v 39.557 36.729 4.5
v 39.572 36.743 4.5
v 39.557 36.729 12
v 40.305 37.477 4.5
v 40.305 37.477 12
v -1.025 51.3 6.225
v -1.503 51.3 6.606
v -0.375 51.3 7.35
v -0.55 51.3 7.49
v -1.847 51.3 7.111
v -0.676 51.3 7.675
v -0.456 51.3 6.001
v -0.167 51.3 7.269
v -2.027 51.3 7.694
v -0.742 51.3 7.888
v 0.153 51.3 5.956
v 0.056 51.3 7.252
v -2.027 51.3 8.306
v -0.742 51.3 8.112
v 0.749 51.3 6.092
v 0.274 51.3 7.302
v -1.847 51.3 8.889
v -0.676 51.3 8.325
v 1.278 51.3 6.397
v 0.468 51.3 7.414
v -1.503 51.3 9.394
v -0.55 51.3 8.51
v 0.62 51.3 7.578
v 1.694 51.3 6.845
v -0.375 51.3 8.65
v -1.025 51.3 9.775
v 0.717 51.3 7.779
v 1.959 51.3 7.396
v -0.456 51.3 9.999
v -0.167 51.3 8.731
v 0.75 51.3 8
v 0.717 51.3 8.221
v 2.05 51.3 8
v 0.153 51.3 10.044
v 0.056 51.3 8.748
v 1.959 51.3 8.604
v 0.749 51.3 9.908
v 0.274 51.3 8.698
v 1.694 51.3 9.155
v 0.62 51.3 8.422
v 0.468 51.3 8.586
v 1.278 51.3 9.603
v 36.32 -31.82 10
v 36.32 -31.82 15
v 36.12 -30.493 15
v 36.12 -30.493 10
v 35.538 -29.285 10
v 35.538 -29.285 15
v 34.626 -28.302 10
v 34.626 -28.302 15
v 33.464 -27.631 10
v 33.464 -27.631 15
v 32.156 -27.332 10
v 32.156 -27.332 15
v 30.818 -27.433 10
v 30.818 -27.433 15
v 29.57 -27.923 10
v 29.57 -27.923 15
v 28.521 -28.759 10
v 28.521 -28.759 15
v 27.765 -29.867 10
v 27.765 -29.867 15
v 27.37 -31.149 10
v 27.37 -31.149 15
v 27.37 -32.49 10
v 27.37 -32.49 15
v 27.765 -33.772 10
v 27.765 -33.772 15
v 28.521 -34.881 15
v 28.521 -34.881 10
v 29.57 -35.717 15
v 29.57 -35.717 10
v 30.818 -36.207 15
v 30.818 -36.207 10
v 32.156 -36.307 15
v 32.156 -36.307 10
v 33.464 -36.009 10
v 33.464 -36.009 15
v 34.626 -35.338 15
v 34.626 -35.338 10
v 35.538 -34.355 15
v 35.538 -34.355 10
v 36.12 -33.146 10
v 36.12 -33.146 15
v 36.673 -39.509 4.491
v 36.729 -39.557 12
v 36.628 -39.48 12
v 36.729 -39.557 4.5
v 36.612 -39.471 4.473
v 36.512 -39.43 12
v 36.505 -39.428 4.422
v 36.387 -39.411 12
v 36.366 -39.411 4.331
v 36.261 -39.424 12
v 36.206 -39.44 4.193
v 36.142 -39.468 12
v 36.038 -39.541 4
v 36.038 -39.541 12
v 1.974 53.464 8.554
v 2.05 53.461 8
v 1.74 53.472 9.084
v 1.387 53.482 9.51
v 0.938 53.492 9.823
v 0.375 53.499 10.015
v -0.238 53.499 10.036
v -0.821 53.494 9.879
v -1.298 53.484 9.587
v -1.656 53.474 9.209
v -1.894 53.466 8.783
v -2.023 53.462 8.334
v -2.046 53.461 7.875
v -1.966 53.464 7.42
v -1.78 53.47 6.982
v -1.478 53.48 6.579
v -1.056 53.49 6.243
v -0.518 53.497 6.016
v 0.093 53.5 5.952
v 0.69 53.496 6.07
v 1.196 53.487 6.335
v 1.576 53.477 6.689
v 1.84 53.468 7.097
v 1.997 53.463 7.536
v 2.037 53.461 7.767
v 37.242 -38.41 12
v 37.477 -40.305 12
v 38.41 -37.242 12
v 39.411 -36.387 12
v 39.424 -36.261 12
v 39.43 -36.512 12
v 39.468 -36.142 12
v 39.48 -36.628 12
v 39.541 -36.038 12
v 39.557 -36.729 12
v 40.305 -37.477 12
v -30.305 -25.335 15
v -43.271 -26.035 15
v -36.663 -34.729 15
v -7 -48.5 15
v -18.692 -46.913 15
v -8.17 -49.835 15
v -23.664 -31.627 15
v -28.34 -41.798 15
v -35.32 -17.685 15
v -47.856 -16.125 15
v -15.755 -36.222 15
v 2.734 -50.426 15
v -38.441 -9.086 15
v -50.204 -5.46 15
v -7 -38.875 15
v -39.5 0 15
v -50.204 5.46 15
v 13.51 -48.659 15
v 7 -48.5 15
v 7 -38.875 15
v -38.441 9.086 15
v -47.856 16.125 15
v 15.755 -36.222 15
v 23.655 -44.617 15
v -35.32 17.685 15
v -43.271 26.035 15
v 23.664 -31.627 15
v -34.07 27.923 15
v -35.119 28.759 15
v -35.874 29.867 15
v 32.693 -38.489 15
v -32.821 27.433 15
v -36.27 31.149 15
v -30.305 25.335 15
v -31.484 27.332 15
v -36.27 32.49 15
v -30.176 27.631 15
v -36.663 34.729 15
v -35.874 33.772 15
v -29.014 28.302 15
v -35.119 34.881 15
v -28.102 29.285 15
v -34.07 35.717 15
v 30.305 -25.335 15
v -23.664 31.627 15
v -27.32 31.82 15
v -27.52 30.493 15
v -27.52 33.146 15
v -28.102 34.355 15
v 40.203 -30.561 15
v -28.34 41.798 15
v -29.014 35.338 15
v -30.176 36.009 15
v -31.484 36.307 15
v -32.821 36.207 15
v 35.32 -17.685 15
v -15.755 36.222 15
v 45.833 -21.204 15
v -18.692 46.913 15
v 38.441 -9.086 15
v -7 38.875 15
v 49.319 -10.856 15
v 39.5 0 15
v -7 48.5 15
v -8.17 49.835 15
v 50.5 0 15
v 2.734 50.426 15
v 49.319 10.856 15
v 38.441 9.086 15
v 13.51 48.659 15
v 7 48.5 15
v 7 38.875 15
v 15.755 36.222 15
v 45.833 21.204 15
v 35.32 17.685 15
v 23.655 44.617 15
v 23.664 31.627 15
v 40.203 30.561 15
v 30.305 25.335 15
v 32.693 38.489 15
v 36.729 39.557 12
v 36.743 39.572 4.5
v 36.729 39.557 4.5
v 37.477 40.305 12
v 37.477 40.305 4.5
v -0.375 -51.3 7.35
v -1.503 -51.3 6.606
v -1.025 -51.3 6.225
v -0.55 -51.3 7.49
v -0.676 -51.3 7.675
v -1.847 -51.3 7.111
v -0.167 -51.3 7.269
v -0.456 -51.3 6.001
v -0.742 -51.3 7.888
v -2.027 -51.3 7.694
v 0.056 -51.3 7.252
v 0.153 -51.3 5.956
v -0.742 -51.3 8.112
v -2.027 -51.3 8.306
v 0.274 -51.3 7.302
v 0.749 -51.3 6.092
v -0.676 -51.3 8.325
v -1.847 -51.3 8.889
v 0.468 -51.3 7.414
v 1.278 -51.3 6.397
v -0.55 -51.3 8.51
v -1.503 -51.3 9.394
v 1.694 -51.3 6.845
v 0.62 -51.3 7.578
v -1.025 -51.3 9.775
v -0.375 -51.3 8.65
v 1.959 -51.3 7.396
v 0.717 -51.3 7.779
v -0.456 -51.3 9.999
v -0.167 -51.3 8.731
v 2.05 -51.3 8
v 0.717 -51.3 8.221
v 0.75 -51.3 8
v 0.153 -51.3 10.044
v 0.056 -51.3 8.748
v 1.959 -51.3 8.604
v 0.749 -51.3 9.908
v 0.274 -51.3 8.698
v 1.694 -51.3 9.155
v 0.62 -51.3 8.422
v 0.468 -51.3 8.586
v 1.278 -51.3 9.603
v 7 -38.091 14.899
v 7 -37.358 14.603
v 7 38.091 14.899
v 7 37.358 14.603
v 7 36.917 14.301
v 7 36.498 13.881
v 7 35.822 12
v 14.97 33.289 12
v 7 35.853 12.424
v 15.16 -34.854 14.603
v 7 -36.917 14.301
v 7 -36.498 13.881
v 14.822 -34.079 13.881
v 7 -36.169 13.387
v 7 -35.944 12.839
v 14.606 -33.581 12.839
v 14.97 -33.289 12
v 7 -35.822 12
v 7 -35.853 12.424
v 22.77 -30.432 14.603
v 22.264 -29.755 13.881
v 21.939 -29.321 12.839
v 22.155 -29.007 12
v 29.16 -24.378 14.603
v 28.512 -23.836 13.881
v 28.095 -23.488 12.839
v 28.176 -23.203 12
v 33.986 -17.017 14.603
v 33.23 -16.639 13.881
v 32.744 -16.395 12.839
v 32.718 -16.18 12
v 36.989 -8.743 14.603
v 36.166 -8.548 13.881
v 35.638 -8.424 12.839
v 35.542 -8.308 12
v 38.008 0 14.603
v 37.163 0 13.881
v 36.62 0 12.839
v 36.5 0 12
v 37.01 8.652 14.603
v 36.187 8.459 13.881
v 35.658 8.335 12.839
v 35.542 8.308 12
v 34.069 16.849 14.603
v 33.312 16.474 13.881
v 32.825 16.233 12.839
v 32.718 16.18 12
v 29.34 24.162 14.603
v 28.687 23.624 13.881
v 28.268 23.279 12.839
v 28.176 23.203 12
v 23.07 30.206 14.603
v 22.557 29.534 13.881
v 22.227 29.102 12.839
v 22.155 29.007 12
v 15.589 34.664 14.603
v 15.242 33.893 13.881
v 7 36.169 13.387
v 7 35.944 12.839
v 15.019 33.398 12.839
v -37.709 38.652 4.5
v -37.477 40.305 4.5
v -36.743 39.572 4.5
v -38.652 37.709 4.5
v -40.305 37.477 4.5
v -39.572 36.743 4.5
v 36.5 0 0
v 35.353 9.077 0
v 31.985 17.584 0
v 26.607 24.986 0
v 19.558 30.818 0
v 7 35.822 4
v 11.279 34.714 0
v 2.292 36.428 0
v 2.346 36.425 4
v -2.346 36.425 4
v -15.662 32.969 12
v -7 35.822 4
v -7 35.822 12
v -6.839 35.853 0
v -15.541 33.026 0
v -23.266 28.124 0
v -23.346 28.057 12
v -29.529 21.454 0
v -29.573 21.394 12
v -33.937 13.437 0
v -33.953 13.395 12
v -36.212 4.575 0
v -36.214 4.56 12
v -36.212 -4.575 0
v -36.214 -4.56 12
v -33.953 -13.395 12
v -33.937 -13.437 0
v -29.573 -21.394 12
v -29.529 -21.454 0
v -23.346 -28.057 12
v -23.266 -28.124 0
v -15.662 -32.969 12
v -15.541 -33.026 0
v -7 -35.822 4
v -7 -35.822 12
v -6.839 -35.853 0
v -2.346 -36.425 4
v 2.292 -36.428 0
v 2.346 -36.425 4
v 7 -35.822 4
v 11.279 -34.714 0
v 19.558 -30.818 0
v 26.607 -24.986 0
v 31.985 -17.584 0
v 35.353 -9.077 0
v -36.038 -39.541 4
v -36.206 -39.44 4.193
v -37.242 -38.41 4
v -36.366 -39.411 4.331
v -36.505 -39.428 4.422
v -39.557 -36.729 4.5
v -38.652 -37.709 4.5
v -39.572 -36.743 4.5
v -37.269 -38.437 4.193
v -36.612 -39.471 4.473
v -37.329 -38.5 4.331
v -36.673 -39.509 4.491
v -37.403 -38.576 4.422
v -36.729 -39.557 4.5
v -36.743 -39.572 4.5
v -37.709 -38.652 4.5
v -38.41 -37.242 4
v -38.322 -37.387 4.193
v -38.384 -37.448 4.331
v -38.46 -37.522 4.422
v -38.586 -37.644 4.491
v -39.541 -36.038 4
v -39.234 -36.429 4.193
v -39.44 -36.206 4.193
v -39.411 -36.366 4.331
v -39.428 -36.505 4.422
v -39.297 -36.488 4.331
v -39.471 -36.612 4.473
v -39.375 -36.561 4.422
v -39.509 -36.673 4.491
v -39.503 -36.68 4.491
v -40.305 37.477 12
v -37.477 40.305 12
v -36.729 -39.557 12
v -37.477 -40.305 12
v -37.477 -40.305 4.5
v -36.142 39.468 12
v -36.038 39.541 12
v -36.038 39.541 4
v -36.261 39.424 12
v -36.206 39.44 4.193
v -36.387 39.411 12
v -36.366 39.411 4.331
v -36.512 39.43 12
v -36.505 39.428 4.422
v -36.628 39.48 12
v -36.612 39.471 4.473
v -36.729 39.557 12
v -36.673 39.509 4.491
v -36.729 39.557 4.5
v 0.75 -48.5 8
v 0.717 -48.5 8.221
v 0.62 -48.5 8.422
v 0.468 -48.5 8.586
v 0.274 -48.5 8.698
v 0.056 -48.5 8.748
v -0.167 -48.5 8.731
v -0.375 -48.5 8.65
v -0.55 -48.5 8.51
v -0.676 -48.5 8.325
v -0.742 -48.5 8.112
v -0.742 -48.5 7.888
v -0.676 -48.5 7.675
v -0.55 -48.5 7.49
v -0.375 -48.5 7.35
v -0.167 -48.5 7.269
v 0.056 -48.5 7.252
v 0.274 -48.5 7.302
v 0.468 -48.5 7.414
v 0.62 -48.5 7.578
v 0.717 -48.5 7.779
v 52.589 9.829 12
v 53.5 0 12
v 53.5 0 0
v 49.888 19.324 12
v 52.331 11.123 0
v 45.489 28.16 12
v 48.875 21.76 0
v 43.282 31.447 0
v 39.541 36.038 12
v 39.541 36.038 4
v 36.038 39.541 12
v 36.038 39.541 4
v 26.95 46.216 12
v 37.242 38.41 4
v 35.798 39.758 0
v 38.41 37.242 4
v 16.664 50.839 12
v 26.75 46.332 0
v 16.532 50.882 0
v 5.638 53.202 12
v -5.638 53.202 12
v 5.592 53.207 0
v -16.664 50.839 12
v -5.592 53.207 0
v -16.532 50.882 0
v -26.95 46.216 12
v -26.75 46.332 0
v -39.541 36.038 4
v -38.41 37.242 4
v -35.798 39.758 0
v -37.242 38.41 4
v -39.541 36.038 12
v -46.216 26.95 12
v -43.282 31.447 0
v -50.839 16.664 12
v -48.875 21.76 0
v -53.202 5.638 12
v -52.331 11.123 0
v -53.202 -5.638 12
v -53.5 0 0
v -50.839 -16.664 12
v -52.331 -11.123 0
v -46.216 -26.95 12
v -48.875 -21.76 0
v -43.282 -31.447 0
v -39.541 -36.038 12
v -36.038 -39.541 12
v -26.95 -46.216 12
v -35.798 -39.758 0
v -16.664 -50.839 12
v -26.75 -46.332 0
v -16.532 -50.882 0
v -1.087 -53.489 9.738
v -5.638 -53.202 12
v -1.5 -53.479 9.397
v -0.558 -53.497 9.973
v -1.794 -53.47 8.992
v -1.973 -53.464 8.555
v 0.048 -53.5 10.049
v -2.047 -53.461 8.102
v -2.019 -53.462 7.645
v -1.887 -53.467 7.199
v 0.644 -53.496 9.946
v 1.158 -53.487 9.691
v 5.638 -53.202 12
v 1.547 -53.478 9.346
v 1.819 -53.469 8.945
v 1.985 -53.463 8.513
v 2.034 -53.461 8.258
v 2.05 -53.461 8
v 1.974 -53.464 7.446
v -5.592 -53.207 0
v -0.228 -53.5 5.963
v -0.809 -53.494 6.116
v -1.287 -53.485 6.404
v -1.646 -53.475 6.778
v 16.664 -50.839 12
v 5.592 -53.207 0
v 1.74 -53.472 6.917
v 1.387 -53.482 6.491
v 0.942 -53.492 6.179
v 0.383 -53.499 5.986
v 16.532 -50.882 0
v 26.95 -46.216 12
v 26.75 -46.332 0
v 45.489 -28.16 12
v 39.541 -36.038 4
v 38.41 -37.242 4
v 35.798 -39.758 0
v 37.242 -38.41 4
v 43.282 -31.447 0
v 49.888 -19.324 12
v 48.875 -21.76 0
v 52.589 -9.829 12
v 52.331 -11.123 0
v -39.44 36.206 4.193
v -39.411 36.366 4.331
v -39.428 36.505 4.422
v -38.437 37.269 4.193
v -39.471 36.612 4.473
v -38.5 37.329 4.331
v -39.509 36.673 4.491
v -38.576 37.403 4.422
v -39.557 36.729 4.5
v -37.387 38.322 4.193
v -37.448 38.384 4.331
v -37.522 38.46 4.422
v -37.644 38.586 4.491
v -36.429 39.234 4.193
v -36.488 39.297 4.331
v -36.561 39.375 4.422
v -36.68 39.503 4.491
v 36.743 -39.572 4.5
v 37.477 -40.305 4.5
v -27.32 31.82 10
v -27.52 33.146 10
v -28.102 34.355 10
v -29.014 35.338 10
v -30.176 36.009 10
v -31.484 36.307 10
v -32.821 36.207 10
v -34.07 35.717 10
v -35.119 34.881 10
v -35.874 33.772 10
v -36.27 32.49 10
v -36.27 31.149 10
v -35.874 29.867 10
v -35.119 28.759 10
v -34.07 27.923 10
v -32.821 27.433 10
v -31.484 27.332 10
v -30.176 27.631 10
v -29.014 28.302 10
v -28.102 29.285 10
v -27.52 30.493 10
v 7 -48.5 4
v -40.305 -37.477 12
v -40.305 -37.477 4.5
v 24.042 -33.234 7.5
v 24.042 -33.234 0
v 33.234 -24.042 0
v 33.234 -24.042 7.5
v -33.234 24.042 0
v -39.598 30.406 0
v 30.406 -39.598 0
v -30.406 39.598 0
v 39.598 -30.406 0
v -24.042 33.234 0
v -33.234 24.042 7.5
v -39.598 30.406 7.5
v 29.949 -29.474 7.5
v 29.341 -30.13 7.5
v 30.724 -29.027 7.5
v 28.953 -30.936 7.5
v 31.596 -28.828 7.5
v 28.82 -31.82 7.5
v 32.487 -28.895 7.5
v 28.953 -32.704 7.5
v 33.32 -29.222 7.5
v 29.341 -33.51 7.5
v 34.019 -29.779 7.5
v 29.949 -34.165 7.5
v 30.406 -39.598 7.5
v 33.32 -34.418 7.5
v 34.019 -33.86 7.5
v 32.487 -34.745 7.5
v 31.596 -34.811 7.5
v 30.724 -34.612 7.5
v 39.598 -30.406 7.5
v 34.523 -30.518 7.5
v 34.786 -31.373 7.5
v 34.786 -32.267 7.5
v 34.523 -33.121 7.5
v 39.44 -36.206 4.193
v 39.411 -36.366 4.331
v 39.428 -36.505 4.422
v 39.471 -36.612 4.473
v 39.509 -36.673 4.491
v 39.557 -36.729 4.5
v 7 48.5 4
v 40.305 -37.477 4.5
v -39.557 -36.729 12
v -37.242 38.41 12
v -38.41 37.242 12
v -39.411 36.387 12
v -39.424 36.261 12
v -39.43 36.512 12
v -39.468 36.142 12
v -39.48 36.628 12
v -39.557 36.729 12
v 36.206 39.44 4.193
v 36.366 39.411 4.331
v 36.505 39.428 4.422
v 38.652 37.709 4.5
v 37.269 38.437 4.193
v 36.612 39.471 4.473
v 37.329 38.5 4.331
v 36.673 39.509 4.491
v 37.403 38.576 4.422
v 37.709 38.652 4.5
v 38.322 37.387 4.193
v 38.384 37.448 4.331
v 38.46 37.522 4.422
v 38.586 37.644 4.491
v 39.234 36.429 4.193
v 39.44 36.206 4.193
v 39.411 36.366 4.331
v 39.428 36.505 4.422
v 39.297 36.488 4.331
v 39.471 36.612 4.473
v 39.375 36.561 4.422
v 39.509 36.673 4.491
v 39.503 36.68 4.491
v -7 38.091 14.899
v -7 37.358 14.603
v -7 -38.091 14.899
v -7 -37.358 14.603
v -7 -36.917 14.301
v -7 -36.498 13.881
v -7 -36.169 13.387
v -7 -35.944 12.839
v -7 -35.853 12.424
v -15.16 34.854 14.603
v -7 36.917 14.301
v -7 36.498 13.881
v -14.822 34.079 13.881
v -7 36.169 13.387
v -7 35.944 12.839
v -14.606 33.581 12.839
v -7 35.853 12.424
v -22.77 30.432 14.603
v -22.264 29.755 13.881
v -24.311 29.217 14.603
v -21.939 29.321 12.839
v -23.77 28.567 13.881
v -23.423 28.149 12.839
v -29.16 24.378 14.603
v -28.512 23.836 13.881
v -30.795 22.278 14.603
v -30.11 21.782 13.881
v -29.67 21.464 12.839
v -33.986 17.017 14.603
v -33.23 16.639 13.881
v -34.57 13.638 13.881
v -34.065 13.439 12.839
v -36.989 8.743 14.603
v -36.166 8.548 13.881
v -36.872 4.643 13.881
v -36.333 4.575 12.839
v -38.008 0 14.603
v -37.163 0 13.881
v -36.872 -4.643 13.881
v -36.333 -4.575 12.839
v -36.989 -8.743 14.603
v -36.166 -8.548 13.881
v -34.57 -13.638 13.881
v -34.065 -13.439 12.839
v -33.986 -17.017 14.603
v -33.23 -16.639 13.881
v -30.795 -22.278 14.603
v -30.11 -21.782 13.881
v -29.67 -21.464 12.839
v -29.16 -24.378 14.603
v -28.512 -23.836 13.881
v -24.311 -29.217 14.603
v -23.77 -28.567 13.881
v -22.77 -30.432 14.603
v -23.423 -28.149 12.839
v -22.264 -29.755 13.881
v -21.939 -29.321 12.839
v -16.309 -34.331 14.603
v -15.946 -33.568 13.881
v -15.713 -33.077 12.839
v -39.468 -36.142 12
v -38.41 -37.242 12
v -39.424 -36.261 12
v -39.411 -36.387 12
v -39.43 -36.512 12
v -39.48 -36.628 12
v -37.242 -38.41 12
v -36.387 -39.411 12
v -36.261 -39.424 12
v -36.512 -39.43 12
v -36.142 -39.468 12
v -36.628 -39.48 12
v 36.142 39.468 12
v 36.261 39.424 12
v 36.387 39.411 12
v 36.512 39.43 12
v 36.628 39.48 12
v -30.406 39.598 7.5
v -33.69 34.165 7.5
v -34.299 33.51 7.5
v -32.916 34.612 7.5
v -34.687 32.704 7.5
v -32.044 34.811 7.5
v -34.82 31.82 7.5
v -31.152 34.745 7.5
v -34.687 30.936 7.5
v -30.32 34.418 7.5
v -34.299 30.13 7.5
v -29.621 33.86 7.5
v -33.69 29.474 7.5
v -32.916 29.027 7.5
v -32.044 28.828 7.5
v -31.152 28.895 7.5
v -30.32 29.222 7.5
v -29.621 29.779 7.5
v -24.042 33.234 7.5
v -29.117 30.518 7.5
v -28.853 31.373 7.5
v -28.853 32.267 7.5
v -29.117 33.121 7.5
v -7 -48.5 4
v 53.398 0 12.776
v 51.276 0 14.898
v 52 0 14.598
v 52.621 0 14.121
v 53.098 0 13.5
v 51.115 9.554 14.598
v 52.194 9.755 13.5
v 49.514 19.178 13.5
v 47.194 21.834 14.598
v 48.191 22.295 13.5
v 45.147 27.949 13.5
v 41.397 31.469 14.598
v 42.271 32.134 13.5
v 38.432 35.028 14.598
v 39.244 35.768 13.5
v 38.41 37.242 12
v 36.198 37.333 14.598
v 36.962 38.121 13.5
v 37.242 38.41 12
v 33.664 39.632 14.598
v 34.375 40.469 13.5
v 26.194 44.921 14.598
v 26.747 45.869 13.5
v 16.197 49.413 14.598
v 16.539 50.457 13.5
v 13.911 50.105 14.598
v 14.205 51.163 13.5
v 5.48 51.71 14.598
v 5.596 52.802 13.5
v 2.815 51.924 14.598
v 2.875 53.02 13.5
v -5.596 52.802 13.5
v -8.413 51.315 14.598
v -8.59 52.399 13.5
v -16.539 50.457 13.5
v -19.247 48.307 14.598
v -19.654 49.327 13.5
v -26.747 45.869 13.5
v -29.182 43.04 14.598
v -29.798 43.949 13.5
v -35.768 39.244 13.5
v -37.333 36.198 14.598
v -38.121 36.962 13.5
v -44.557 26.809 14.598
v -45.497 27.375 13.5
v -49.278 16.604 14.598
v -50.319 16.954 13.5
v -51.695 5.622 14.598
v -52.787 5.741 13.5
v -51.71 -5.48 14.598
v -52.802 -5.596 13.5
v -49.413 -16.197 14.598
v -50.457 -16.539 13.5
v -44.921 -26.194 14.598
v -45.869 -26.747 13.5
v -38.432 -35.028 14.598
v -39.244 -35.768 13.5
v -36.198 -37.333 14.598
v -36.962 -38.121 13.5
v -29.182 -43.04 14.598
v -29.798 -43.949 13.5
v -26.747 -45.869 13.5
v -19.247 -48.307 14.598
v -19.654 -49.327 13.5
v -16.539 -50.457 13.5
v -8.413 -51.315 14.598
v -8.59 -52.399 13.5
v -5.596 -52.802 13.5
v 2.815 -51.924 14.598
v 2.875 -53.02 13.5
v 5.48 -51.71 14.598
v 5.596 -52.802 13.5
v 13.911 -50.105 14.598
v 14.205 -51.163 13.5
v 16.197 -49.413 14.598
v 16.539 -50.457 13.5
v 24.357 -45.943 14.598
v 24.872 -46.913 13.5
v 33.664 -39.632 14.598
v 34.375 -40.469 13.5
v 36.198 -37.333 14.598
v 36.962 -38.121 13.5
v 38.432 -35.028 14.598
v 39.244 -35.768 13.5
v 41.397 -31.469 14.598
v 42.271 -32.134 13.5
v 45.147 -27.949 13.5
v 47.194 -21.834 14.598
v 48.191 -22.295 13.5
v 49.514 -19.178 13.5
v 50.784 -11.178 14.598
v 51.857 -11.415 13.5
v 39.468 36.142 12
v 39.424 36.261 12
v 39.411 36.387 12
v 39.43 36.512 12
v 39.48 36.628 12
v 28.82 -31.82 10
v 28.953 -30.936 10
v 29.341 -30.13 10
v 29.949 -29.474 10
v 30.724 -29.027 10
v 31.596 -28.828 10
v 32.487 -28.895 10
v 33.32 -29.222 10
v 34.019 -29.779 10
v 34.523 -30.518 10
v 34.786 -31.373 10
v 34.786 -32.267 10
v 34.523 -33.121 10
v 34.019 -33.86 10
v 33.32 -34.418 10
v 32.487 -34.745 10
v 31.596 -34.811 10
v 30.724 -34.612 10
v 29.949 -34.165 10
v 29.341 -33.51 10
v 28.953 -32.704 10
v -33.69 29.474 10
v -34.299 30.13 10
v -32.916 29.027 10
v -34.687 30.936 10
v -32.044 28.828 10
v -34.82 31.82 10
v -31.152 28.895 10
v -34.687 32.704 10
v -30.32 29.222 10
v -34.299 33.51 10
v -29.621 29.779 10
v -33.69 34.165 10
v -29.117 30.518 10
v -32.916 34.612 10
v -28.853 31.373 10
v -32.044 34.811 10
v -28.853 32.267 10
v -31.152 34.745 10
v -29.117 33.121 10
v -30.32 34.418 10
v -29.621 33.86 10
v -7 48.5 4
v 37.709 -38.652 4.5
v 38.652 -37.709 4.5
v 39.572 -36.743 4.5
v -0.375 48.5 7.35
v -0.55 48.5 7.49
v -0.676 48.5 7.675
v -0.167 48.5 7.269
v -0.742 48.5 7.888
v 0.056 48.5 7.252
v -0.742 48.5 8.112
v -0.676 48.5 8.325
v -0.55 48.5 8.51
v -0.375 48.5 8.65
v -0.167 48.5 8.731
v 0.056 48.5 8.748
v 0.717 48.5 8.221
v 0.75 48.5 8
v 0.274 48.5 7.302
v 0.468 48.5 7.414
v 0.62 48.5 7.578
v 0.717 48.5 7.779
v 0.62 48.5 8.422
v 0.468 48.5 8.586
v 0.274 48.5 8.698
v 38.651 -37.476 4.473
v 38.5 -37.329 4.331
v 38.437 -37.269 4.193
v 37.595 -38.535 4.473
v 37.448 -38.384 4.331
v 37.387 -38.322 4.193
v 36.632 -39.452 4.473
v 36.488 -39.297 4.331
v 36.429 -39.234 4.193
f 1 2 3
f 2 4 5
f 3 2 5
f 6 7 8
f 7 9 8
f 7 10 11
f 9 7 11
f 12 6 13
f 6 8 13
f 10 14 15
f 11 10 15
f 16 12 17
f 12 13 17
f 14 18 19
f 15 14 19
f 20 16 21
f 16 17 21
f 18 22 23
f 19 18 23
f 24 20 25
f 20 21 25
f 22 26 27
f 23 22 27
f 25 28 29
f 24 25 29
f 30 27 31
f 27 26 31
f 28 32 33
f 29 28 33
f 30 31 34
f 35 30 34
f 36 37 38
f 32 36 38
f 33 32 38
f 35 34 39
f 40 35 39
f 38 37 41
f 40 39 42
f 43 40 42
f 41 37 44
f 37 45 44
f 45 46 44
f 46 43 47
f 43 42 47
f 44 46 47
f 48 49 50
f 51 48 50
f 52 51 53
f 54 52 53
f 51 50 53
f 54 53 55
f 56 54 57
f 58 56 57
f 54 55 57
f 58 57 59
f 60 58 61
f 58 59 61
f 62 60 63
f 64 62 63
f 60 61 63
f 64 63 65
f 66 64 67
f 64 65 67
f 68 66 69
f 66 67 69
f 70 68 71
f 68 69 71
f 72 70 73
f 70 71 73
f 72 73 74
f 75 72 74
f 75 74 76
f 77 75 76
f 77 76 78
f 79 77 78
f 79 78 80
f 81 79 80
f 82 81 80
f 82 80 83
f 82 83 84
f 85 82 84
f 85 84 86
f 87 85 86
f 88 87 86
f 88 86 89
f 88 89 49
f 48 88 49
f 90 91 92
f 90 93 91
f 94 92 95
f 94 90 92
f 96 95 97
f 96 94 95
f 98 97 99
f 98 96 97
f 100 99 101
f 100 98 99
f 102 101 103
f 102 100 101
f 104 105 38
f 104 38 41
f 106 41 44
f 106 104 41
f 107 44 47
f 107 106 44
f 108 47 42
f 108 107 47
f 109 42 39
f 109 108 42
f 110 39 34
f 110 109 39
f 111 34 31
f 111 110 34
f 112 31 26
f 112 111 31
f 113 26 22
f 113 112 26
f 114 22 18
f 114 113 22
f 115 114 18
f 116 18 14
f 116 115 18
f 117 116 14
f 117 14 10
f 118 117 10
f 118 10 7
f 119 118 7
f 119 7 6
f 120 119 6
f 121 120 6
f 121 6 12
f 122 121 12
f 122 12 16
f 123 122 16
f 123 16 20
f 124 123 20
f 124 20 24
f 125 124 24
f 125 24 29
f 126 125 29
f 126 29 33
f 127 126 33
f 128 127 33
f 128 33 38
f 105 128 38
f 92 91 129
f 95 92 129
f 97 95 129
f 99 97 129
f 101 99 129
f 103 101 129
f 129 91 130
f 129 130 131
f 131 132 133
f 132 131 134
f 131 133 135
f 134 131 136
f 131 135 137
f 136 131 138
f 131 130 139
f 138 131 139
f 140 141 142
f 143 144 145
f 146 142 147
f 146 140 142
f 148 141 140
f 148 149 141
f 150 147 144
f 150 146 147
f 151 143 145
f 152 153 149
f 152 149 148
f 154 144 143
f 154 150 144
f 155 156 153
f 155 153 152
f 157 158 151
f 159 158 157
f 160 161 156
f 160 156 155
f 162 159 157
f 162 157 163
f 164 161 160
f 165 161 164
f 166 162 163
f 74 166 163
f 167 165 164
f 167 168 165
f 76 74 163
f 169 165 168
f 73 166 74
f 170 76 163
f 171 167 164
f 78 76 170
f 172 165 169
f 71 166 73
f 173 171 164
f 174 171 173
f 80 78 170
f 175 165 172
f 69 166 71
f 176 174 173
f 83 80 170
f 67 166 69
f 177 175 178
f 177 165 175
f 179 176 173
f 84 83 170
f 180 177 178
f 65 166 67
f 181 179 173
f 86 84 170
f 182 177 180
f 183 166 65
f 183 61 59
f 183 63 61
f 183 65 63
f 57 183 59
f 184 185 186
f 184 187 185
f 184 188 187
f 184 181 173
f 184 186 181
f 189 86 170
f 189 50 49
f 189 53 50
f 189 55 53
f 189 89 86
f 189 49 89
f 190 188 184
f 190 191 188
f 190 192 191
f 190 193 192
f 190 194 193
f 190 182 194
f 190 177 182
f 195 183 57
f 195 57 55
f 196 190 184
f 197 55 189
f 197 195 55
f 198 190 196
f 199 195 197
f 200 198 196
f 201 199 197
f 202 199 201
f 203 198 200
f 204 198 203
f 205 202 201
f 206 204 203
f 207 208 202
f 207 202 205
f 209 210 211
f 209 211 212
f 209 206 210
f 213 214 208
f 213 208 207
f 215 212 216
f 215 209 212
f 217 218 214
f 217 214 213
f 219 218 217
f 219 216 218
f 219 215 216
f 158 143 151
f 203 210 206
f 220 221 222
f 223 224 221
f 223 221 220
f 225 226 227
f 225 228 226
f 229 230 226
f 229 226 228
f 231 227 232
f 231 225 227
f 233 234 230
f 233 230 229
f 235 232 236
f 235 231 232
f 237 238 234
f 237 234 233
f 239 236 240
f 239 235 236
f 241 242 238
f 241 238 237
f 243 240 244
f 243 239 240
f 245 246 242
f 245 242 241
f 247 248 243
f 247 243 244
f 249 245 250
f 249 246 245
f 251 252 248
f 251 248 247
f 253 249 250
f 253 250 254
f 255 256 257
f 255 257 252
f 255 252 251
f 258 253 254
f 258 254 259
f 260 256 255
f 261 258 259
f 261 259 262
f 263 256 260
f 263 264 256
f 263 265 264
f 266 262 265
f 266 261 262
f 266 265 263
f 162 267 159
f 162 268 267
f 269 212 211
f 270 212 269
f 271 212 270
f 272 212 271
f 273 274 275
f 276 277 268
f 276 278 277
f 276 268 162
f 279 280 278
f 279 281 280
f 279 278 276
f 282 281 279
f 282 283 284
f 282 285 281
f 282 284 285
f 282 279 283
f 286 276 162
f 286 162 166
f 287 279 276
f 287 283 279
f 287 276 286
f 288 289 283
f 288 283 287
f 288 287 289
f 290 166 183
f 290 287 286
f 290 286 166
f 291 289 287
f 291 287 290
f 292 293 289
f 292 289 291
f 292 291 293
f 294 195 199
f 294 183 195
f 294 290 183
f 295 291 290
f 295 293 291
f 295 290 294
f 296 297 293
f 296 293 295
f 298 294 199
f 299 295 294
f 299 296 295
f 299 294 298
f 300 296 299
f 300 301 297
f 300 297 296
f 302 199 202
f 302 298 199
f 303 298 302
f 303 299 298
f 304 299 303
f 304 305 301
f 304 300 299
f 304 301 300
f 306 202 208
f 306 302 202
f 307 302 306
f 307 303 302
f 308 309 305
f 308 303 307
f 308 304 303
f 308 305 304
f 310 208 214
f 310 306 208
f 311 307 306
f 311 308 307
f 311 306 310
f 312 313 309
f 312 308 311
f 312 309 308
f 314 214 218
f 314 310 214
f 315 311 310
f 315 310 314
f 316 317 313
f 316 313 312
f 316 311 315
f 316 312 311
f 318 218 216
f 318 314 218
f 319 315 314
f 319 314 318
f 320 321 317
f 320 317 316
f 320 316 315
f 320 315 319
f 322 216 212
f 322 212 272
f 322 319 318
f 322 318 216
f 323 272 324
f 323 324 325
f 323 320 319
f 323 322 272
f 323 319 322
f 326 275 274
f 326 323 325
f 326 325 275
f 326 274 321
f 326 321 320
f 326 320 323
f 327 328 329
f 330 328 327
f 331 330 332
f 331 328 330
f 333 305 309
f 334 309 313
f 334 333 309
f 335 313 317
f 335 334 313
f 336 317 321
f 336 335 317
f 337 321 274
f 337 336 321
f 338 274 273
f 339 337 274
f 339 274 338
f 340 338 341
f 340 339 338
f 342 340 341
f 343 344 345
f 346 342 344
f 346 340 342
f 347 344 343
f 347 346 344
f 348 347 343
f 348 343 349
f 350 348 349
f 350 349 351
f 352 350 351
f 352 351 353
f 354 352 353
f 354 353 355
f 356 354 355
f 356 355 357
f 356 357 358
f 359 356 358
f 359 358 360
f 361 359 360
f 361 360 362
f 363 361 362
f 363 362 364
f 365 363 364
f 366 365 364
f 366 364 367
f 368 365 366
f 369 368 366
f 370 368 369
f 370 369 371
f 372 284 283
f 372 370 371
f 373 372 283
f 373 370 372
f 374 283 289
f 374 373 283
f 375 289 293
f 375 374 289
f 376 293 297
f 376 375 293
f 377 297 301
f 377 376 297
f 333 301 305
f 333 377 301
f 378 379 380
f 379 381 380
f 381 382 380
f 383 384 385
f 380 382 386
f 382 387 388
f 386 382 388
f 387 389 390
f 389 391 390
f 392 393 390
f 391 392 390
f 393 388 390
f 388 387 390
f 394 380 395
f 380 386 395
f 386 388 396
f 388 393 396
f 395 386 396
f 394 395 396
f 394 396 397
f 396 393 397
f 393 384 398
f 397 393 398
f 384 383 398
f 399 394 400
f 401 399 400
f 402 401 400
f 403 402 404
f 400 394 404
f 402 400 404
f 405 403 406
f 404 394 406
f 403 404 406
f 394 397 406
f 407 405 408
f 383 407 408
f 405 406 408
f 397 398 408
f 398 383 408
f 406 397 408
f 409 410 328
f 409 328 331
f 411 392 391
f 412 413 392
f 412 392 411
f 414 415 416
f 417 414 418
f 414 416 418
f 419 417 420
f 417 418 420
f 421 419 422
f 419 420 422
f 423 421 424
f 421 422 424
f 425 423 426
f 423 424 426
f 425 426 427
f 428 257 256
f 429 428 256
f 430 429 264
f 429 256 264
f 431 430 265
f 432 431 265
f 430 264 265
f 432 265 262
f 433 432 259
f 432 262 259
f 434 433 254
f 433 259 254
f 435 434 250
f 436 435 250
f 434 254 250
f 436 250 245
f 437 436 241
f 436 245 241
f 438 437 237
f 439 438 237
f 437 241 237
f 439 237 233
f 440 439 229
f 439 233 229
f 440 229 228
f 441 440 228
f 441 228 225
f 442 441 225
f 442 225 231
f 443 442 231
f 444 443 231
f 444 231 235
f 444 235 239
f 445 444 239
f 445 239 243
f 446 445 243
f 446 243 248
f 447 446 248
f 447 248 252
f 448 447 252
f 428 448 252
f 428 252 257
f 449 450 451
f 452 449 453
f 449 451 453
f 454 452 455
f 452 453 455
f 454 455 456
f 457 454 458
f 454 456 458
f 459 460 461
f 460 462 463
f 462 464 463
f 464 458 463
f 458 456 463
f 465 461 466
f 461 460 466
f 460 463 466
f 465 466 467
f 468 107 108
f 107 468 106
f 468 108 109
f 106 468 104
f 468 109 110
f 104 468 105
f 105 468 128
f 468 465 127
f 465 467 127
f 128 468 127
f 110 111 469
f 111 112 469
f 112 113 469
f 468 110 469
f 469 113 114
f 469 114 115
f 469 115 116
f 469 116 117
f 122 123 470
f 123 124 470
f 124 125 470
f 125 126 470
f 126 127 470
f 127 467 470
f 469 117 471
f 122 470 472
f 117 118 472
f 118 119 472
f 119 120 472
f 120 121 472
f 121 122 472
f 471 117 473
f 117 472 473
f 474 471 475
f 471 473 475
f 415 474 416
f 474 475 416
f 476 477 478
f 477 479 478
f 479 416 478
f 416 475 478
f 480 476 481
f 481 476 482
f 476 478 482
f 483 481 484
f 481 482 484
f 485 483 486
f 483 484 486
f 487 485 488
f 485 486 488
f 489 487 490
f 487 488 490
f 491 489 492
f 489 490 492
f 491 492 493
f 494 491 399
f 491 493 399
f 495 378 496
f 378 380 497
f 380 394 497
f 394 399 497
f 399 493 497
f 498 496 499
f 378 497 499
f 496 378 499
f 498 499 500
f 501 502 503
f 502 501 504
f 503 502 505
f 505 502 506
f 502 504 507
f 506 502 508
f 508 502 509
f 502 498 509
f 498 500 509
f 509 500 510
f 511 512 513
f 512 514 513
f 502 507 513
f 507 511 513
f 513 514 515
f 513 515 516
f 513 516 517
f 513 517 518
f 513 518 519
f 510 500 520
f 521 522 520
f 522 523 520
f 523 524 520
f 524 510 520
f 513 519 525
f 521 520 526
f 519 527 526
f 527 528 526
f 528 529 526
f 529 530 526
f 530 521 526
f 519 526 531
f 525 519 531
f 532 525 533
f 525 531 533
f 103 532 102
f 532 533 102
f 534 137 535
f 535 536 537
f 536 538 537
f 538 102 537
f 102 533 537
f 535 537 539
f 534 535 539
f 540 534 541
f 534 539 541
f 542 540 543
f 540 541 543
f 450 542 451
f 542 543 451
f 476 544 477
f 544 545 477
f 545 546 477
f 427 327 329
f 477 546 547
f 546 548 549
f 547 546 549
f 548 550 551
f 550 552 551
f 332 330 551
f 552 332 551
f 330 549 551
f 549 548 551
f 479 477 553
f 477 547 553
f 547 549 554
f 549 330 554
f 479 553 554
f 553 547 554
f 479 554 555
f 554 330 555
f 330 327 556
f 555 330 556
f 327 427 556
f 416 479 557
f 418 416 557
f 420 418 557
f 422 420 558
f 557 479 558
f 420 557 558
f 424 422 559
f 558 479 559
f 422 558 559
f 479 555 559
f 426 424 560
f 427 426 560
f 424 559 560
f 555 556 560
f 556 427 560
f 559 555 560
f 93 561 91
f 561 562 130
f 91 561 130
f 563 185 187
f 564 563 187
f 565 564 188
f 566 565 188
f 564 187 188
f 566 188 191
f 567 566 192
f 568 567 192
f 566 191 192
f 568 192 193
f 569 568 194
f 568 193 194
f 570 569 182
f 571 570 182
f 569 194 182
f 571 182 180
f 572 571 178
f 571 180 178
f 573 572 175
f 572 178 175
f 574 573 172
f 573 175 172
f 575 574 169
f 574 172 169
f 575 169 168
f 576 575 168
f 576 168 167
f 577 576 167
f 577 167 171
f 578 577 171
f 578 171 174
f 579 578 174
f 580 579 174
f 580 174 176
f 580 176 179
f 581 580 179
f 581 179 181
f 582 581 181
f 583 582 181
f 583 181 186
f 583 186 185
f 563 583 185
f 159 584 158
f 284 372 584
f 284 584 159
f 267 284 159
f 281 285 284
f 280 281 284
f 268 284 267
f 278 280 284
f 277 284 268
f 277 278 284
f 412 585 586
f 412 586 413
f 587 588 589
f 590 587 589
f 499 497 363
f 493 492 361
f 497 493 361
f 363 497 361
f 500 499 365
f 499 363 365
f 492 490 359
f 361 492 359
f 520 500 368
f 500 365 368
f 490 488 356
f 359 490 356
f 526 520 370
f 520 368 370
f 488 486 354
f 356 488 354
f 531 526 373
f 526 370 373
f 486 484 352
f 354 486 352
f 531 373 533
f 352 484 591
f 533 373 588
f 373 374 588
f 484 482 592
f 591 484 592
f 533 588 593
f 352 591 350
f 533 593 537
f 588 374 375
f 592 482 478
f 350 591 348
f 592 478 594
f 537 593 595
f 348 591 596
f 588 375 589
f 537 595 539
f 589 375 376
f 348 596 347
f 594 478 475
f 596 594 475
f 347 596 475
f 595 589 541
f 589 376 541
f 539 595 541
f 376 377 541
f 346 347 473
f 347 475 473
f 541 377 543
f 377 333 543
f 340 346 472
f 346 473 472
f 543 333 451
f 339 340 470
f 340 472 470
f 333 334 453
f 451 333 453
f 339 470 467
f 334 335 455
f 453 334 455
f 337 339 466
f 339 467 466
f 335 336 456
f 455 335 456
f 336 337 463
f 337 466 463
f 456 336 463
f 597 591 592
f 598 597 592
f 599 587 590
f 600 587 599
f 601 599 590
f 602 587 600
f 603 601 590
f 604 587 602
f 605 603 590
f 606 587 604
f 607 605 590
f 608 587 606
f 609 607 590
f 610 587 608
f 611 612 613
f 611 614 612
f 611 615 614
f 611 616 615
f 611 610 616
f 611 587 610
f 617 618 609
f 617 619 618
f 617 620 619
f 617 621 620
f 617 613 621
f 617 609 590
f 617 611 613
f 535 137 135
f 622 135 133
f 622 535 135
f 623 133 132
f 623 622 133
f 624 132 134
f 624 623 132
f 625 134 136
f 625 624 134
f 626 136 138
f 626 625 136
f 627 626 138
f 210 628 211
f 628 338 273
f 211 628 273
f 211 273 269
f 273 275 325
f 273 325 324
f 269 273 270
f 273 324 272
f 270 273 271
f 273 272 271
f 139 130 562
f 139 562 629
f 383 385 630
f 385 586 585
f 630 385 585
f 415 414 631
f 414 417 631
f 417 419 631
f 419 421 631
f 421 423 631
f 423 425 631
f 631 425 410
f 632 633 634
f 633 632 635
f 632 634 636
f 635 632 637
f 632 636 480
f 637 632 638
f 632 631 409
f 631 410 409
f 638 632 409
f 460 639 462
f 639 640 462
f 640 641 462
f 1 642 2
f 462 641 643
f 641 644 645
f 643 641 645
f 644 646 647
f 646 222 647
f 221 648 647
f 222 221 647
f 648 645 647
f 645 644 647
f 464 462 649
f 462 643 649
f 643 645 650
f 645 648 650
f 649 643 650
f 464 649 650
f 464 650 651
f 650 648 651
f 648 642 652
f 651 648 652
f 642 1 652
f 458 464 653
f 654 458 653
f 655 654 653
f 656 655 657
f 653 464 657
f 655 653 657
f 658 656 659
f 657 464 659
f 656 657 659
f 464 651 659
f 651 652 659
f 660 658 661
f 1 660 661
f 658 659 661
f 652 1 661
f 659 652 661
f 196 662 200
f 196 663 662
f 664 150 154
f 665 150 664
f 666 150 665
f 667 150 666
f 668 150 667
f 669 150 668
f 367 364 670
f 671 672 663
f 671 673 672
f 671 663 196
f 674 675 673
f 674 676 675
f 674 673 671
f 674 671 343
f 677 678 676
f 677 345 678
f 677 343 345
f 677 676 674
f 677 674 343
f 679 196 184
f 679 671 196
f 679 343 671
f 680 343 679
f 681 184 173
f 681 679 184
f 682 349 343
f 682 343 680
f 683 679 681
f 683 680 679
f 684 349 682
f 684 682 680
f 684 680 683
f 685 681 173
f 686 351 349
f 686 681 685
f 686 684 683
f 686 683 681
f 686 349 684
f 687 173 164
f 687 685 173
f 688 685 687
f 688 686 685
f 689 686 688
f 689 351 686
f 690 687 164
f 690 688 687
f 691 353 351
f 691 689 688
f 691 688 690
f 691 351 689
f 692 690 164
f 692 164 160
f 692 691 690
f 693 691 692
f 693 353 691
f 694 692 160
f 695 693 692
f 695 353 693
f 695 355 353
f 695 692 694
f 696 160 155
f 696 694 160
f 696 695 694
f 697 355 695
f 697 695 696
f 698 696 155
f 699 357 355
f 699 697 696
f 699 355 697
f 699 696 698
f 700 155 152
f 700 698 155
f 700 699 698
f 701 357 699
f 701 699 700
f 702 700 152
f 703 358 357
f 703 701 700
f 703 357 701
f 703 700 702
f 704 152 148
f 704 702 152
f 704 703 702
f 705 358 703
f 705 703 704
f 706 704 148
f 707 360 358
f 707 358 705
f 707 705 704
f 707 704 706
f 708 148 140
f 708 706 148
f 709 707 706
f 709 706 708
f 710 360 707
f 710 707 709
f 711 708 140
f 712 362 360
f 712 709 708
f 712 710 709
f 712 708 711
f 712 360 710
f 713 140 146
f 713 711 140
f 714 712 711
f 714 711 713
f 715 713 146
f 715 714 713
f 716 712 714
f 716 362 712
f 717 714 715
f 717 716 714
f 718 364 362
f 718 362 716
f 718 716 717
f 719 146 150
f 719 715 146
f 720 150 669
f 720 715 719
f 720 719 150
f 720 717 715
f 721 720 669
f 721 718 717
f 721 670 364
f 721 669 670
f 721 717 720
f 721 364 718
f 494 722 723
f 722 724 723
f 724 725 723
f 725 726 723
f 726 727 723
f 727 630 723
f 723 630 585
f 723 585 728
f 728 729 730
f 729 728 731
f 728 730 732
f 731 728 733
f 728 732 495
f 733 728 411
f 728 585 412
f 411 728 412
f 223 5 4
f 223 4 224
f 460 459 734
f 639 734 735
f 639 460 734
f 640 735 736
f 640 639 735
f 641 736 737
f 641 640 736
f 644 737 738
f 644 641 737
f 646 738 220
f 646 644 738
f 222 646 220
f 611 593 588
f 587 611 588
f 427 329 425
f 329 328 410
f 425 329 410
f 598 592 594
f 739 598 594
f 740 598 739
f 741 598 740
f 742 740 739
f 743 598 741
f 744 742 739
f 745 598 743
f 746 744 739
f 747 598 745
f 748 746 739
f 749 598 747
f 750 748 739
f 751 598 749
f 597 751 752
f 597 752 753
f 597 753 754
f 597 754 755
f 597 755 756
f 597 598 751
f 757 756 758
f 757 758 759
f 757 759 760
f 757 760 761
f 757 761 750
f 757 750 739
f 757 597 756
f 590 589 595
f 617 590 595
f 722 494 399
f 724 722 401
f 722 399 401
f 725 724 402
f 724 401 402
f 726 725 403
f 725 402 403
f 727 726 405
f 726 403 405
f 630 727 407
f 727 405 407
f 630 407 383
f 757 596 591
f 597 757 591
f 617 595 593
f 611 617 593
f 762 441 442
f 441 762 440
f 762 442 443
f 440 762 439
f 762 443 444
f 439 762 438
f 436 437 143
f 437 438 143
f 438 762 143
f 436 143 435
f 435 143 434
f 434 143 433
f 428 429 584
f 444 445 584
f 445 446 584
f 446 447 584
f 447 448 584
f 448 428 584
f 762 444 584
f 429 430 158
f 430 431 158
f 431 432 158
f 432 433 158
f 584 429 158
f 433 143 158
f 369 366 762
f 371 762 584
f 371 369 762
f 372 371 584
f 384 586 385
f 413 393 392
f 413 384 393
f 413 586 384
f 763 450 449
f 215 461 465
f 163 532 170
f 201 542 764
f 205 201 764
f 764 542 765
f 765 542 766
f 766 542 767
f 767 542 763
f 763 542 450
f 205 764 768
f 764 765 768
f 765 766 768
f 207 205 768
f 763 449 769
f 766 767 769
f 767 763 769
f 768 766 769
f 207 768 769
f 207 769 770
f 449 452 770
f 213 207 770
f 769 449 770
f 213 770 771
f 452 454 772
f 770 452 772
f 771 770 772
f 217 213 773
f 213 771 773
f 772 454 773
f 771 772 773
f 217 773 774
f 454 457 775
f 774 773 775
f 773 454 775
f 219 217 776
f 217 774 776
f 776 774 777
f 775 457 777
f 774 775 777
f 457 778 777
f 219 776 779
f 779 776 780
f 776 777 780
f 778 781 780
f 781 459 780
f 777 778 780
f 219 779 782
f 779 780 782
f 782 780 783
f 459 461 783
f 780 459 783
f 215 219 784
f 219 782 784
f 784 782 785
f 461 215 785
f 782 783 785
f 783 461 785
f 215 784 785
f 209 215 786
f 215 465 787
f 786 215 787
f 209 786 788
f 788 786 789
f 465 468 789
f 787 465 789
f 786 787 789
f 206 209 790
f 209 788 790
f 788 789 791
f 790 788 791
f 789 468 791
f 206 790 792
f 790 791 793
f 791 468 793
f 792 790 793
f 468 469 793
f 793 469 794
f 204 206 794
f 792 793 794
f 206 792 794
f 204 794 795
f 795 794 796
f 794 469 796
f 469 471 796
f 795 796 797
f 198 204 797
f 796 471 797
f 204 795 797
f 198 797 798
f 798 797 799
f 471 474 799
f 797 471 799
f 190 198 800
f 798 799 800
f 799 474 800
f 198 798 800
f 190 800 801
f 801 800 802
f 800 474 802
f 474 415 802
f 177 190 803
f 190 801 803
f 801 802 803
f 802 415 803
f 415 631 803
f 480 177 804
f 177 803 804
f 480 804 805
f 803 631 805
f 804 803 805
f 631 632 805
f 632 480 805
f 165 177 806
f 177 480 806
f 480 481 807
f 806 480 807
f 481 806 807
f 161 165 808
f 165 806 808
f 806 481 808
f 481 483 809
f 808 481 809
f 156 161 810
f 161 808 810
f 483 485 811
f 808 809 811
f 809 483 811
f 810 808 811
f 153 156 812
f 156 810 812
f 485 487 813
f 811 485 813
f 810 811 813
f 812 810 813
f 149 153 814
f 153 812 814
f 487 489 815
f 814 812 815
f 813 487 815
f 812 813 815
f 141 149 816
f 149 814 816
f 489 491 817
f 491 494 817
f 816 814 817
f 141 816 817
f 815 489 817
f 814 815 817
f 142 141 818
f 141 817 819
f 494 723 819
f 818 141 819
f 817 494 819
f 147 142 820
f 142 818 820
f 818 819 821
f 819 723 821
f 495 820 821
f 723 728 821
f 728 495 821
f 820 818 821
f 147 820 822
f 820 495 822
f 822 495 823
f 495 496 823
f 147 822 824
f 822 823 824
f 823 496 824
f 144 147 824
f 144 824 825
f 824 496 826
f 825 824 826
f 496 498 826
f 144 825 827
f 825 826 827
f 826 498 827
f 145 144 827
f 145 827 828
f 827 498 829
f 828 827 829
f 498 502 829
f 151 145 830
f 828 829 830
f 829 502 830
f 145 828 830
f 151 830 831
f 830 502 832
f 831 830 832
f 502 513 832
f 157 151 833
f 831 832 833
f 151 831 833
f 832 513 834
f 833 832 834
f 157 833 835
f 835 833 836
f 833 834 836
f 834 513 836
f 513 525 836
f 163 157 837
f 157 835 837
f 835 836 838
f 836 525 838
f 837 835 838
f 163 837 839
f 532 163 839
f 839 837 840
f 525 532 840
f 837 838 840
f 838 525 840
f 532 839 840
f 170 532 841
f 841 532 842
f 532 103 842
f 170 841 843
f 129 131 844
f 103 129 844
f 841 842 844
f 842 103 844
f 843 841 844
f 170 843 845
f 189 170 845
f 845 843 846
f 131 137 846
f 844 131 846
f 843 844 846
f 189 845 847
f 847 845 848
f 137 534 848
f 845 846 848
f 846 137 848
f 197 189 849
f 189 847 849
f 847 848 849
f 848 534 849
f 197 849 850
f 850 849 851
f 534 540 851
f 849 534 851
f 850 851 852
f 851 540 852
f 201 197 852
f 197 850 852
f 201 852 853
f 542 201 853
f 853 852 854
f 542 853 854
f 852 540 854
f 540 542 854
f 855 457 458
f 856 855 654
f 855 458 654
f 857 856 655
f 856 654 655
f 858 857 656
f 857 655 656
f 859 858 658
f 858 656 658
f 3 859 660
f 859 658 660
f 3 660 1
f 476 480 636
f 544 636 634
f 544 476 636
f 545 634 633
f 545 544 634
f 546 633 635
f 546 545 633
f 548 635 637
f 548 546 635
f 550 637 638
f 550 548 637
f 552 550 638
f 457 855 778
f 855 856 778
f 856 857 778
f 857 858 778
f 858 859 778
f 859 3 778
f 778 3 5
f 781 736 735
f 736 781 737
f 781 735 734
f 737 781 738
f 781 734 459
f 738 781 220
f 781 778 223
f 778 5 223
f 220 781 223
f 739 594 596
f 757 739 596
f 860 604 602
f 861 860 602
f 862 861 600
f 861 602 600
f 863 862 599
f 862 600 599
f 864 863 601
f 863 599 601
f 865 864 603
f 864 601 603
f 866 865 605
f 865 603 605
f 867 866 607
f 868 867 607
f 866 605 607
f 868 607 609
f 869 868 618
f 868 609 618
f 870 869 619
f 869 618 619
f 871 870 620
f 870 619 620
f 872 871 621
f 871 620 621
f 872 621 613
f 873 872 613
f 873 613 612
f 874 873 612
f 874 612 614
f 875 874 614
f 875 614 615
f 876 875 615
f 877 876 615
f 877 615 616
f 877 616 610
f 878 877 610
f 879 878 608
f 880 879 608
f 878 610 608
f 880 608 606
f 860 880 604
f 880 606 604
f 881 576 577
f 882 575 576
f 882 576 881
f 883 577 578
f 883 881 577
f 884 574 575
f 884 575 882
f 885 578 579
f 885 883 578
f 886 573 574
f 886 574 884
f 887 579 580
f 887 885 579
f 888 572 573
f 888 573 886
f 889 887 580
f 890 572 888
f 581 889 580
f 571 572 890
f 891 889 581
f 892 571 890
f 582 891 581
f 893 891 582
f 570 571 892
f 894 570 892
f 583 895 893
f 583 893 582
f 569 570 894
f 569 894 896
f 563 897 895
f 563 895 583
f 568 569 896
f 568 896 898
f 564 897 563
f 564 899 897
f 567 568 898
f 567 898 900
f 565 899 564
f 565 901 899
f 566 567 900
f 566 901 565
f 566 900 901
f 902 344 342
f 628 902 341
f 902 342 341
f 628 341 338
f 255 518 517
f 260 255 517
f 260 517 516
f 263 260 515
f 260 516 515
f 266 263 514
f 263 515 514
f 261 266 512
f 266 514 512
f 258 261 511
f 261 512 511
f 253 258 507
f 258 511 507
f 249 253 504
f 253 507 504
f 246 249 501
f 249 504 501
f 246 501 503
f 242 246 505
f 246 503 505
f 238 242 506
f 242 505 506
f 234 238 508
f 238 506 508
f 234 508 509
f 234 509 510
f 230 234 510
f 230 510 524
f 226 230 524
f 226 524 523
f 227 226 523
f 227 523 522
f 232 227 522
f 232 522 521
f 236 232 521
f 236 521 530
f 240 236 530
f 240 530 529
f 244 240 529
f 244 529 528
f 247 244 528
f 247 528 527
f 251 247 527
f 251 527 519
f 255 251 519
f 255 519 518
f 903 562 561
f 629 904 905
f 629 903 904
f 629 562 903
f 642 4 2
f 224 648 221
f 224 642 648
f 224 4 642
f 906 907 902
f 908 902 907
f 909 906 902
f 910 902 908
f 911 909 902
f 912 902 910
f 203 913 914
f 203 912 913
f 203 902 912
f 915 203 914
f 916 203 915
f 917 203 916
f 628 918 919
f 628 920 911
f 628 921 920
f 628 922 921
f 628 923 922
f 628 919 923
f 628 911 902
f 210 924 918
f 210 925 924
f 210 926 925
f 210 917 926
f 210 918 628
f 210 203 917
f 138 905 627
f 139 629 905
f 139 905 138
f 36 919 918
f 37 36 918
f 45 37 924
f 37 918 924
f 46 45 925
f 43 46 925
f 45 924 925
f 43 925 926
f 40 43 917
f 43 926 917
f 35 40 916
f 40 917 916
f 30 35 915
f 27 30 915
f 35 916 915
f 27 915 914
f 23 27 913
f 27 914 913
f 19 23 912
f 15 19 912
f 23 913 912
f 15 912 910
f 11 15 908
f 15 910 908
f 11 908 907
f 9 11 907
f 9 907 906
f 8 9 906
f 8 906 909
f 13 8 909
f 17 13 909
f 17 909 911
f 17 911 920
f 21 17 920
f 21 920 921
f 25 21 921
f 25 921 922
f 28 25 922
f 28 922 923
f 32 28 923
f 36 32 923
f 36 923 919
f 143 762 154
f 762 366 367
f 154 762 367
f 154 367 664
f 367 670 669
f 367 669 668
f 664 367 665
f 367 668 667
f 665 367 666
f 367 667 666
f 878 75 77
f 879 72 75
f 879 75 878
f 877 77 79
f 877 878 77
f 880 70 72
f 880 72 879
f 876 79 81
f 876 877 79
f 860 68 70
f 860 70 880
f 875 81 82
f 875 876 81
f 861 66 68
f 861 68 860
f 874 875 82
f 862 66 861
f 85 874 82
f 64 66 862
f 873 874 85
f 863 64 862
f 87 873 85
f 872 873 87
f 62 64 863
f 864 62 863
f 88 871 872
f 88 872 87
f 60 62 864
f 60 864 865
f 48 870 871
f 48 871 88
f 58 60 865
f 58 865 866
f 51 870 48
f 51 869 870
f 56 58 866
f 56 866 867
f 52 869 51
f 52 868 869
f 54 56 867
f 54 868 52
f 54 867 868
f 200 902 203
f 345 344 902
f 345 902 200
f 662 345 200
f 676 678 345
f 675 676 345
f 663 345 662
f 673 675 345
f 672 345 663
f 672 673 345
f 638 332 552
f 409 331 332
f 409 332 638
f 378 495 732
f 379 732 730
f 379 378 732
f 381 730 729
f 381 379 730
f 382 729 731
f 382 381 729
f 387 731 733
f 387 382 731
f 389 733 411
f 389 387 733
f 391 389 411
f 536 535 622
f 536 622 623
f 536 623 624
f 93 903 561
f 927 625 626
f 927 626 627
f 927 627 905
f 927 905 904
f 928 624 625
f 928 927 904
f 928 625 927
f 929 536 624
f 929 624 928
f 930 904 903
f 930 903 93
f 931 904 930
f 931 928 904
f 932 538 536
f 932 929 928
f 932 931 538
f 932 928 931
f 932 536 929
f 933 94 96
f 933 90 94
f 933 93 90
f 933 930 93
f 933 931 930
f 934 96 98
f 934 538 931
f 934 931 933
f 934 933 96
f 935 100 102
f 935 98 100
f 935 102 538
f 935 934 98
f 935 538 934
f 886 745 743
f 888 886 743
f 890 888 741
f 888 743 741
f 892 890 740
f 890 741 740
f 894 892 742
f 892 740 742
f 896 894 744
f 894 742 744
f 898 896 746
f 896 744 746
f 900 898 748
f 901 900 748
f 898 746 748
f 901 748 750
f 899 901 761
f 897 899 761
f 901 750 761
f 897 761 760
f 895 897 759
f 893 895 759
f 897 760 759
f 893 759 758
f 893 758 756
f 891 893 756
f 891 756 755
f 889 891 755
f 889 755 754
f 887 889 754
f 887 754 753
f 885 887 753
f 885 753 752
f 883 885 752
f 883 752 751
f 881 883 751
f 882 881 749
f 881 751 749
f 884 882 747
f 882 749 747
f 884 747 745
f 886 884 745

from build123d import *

# Parameters (mm, degrees)
F0_R             = 53.5
F0_R_2           = 36.5
F1_DEPTH         = 15
F5_D             = 6
F5_CBORE_D       = 9
F5_CBORE_DEPTH   = 5
F7_W             = 14
F7_H             = 11
F8_DEPTH         = 15
F10_W            = 14
F10_H            = 11
F11_DEPTH        = 15
F13_R            = 2.05
F14_DEPTH        = 2.2
F16_R            = 2.05
F17_DEPTH        = 2.2
F18_R            = 3
F19_DEPTH        = 7.5
F20_DEPTH        = 7.5
F21_R            = 3
F22_R            = 3
F25_W            = 4
F25_H            = 7.5
F26_DEPTH        = 1.5
F26_COPIES_COUNT = 4
F27_R            = 0.5
F29_D            = 1.5


# Not quite as in the source:
# - a pattern or mirror of a feature is missing from the dataset's text; its kind, count and spacing are read off the source's solid


with BuildPart() as f1:
    # F0 (on Top) → F1 (new body)
    with BuildSketch(Plane.XY):
        Circle(F0_R)
        Circle(F0_R_2, mode=Mode.SUBTRACT)
    extrude(amount=F1_DEPTH)

    # F5 (through all)
    with Locations(Plane.XY.offset(15)):
        with Locations((-31.8198051534, 31.8198051534), (31.8198051534, -31.8198051534)):
            CounterBoreHole(F5_D / 2, F5_CBORE_D / 2, F5_CBORE_DEPTH)

    # F7 (on plane+point) → F8 (cut)
    with BuildSketch(Plane.XZ.offset(-33.5)):
        with Locations((0, 9.5)):
            Rectangle(F7_W, F7_H)
    extrude(amount=-F8_DEPTH, mode=Mode.SUBTRACT)

    # F10 (on plane+point) → F11 (cut)
    with BuildSketch(Plane.XZ.offset(33.5)):
        with Locations((0, 9.5)):
            Rectangle(F10_W, F10_H)
    extrude(amount=F11_DEPTH, mode=Mode.SUBTRACT)

    # F13 (on plane+point) → F14 (cut)
    with BuildSketch(Plane.XZ.offset(53.5)):
        with Locations((0, 8)):
            Circle(F13_R)
    extrude(amount=-F14_DEPTH, mode=Mode.SUBTRACT)

    # F16 (on plane+point) → F17 (cut)
    with BuildSketch(Plane.XZ.offset(-53.5)):
        with Locations((0, 8)):
            Circle(F16_R)
    extrude(amount=F17_DEPTH, mode=Mode.SUBTRACT)

    # F18 (on face) → F19 (cut)
    with BuildSketch(Plane(origin=(0, 0, 0), x_dir=(1, 0, 0), z_dir=(0, 0, -1))):
        Polygon((-33.2340187158, -24.0416305603), (-39.5979797464, -30.405591591), (-30.405591591, -39.5979797464), (-24.0416305603, -33.2340187158), align=None)
        with Locations((-31.8198051534, -31.8198051534)):
            Circle(F18_R, mode=Mode.SUBTRACT)
    extrude(amount=-F19_DEPTH, mode=Mode.SUBTRACT)

    # F18 (on face) → F20 (cut)
    with BuildSketch(Plane(origin=(0, 0, 0), x_dir=(1, 0, 0), z_dir=(0, 0, -1))):
        Polygon((-33.2340187158, -24.0416305603), (-39.5979797464, -30.405591591), (-30.405591591, -39.5979797464), (-24.0416305603, -33.2340187158), align=None)
        Polygon((30.405591591, 39.5979797464), (24.0416305603, 33.2340187158), (33.2340187158, 24.0416305603), (39.5979797464, 30.405591591), align=None)
    extrude(amount=-F20_DEPTH, mode=Mode.SUBTRACT)

    # F21
    f21_edges = [f1.edges().sort_by_distance(p)[0] for p in [
        (-36.5, 0, 15),
    ]]
    fillet(f21_edges, radius=F21_R)

    # F22
    f22_edges = [f1.edges().sort_by_distance(p)[0] for p in [
        (-53.5, 0, 15),
        (28.175787, 23.202909, 15),
        (28.175787, -23.202909, 15),
    ]]
    fillet(f22_edges, radius=F22_R)

    # F25 (on face) → F26 (join, symmetric)
    with BuildSketch(Plane(origin=(37.8302127935, 37.8302127935, 0), x_dir=(-0.7071067812, 0.7071067812, 0), z_dir=(0.7071067812, 0.7071067812, 0))):
        with Locations((0, 8.25)):
            Rectangle(F25_W, F25_H)
    f26 = extrude(amount=F26_DEPTH, both=True)

    # F26_copies: F26 ×4 about axis
    f26_copies_axis = Axis((0, 0, 0), (0, 0, 1))
    for i in range(1, F26_COPIES_COUNT):
        add(f26.rotate(f26_copies_axis, i * 360 / F26_COPIES_COUNT))

    # F27
    f27_edges = [f1.edges().sort_by_distance(p)[0] for p in [
        (39.217983, 36.389556, 8.25),
        (36.389556, 39.217983, 8.25),
        (37.830213, 37.830213, 4.5),
        (39.217983, -36.389556, 8.25),
        (37.830213, -37.830213, 4.5),
        (36.389556, -39.217983, 8.25),
        (-36.389556, -39.217983, 8.25),
        (-37.830213, -37.830213, 4.5),
        (-39.217983, -36.389556, 8.25),
        (-39.217983, 36.389556, 8.25),
        (-37.830213, 37.830213, 4.5),
        (-36.389556, 39.217983, 8.25),
    ]]
    fillet(f27_edges, radius=F27_R)

    # F29 (through all)
    with Locations(Plane(origin=(0, 51.3, 0), x_dir=(-1, 0, 0), z_dir=(0, 1, 0))):
        with Locations((0, 8)):
            Hole(F29_D / 2)


solid = f1.part
